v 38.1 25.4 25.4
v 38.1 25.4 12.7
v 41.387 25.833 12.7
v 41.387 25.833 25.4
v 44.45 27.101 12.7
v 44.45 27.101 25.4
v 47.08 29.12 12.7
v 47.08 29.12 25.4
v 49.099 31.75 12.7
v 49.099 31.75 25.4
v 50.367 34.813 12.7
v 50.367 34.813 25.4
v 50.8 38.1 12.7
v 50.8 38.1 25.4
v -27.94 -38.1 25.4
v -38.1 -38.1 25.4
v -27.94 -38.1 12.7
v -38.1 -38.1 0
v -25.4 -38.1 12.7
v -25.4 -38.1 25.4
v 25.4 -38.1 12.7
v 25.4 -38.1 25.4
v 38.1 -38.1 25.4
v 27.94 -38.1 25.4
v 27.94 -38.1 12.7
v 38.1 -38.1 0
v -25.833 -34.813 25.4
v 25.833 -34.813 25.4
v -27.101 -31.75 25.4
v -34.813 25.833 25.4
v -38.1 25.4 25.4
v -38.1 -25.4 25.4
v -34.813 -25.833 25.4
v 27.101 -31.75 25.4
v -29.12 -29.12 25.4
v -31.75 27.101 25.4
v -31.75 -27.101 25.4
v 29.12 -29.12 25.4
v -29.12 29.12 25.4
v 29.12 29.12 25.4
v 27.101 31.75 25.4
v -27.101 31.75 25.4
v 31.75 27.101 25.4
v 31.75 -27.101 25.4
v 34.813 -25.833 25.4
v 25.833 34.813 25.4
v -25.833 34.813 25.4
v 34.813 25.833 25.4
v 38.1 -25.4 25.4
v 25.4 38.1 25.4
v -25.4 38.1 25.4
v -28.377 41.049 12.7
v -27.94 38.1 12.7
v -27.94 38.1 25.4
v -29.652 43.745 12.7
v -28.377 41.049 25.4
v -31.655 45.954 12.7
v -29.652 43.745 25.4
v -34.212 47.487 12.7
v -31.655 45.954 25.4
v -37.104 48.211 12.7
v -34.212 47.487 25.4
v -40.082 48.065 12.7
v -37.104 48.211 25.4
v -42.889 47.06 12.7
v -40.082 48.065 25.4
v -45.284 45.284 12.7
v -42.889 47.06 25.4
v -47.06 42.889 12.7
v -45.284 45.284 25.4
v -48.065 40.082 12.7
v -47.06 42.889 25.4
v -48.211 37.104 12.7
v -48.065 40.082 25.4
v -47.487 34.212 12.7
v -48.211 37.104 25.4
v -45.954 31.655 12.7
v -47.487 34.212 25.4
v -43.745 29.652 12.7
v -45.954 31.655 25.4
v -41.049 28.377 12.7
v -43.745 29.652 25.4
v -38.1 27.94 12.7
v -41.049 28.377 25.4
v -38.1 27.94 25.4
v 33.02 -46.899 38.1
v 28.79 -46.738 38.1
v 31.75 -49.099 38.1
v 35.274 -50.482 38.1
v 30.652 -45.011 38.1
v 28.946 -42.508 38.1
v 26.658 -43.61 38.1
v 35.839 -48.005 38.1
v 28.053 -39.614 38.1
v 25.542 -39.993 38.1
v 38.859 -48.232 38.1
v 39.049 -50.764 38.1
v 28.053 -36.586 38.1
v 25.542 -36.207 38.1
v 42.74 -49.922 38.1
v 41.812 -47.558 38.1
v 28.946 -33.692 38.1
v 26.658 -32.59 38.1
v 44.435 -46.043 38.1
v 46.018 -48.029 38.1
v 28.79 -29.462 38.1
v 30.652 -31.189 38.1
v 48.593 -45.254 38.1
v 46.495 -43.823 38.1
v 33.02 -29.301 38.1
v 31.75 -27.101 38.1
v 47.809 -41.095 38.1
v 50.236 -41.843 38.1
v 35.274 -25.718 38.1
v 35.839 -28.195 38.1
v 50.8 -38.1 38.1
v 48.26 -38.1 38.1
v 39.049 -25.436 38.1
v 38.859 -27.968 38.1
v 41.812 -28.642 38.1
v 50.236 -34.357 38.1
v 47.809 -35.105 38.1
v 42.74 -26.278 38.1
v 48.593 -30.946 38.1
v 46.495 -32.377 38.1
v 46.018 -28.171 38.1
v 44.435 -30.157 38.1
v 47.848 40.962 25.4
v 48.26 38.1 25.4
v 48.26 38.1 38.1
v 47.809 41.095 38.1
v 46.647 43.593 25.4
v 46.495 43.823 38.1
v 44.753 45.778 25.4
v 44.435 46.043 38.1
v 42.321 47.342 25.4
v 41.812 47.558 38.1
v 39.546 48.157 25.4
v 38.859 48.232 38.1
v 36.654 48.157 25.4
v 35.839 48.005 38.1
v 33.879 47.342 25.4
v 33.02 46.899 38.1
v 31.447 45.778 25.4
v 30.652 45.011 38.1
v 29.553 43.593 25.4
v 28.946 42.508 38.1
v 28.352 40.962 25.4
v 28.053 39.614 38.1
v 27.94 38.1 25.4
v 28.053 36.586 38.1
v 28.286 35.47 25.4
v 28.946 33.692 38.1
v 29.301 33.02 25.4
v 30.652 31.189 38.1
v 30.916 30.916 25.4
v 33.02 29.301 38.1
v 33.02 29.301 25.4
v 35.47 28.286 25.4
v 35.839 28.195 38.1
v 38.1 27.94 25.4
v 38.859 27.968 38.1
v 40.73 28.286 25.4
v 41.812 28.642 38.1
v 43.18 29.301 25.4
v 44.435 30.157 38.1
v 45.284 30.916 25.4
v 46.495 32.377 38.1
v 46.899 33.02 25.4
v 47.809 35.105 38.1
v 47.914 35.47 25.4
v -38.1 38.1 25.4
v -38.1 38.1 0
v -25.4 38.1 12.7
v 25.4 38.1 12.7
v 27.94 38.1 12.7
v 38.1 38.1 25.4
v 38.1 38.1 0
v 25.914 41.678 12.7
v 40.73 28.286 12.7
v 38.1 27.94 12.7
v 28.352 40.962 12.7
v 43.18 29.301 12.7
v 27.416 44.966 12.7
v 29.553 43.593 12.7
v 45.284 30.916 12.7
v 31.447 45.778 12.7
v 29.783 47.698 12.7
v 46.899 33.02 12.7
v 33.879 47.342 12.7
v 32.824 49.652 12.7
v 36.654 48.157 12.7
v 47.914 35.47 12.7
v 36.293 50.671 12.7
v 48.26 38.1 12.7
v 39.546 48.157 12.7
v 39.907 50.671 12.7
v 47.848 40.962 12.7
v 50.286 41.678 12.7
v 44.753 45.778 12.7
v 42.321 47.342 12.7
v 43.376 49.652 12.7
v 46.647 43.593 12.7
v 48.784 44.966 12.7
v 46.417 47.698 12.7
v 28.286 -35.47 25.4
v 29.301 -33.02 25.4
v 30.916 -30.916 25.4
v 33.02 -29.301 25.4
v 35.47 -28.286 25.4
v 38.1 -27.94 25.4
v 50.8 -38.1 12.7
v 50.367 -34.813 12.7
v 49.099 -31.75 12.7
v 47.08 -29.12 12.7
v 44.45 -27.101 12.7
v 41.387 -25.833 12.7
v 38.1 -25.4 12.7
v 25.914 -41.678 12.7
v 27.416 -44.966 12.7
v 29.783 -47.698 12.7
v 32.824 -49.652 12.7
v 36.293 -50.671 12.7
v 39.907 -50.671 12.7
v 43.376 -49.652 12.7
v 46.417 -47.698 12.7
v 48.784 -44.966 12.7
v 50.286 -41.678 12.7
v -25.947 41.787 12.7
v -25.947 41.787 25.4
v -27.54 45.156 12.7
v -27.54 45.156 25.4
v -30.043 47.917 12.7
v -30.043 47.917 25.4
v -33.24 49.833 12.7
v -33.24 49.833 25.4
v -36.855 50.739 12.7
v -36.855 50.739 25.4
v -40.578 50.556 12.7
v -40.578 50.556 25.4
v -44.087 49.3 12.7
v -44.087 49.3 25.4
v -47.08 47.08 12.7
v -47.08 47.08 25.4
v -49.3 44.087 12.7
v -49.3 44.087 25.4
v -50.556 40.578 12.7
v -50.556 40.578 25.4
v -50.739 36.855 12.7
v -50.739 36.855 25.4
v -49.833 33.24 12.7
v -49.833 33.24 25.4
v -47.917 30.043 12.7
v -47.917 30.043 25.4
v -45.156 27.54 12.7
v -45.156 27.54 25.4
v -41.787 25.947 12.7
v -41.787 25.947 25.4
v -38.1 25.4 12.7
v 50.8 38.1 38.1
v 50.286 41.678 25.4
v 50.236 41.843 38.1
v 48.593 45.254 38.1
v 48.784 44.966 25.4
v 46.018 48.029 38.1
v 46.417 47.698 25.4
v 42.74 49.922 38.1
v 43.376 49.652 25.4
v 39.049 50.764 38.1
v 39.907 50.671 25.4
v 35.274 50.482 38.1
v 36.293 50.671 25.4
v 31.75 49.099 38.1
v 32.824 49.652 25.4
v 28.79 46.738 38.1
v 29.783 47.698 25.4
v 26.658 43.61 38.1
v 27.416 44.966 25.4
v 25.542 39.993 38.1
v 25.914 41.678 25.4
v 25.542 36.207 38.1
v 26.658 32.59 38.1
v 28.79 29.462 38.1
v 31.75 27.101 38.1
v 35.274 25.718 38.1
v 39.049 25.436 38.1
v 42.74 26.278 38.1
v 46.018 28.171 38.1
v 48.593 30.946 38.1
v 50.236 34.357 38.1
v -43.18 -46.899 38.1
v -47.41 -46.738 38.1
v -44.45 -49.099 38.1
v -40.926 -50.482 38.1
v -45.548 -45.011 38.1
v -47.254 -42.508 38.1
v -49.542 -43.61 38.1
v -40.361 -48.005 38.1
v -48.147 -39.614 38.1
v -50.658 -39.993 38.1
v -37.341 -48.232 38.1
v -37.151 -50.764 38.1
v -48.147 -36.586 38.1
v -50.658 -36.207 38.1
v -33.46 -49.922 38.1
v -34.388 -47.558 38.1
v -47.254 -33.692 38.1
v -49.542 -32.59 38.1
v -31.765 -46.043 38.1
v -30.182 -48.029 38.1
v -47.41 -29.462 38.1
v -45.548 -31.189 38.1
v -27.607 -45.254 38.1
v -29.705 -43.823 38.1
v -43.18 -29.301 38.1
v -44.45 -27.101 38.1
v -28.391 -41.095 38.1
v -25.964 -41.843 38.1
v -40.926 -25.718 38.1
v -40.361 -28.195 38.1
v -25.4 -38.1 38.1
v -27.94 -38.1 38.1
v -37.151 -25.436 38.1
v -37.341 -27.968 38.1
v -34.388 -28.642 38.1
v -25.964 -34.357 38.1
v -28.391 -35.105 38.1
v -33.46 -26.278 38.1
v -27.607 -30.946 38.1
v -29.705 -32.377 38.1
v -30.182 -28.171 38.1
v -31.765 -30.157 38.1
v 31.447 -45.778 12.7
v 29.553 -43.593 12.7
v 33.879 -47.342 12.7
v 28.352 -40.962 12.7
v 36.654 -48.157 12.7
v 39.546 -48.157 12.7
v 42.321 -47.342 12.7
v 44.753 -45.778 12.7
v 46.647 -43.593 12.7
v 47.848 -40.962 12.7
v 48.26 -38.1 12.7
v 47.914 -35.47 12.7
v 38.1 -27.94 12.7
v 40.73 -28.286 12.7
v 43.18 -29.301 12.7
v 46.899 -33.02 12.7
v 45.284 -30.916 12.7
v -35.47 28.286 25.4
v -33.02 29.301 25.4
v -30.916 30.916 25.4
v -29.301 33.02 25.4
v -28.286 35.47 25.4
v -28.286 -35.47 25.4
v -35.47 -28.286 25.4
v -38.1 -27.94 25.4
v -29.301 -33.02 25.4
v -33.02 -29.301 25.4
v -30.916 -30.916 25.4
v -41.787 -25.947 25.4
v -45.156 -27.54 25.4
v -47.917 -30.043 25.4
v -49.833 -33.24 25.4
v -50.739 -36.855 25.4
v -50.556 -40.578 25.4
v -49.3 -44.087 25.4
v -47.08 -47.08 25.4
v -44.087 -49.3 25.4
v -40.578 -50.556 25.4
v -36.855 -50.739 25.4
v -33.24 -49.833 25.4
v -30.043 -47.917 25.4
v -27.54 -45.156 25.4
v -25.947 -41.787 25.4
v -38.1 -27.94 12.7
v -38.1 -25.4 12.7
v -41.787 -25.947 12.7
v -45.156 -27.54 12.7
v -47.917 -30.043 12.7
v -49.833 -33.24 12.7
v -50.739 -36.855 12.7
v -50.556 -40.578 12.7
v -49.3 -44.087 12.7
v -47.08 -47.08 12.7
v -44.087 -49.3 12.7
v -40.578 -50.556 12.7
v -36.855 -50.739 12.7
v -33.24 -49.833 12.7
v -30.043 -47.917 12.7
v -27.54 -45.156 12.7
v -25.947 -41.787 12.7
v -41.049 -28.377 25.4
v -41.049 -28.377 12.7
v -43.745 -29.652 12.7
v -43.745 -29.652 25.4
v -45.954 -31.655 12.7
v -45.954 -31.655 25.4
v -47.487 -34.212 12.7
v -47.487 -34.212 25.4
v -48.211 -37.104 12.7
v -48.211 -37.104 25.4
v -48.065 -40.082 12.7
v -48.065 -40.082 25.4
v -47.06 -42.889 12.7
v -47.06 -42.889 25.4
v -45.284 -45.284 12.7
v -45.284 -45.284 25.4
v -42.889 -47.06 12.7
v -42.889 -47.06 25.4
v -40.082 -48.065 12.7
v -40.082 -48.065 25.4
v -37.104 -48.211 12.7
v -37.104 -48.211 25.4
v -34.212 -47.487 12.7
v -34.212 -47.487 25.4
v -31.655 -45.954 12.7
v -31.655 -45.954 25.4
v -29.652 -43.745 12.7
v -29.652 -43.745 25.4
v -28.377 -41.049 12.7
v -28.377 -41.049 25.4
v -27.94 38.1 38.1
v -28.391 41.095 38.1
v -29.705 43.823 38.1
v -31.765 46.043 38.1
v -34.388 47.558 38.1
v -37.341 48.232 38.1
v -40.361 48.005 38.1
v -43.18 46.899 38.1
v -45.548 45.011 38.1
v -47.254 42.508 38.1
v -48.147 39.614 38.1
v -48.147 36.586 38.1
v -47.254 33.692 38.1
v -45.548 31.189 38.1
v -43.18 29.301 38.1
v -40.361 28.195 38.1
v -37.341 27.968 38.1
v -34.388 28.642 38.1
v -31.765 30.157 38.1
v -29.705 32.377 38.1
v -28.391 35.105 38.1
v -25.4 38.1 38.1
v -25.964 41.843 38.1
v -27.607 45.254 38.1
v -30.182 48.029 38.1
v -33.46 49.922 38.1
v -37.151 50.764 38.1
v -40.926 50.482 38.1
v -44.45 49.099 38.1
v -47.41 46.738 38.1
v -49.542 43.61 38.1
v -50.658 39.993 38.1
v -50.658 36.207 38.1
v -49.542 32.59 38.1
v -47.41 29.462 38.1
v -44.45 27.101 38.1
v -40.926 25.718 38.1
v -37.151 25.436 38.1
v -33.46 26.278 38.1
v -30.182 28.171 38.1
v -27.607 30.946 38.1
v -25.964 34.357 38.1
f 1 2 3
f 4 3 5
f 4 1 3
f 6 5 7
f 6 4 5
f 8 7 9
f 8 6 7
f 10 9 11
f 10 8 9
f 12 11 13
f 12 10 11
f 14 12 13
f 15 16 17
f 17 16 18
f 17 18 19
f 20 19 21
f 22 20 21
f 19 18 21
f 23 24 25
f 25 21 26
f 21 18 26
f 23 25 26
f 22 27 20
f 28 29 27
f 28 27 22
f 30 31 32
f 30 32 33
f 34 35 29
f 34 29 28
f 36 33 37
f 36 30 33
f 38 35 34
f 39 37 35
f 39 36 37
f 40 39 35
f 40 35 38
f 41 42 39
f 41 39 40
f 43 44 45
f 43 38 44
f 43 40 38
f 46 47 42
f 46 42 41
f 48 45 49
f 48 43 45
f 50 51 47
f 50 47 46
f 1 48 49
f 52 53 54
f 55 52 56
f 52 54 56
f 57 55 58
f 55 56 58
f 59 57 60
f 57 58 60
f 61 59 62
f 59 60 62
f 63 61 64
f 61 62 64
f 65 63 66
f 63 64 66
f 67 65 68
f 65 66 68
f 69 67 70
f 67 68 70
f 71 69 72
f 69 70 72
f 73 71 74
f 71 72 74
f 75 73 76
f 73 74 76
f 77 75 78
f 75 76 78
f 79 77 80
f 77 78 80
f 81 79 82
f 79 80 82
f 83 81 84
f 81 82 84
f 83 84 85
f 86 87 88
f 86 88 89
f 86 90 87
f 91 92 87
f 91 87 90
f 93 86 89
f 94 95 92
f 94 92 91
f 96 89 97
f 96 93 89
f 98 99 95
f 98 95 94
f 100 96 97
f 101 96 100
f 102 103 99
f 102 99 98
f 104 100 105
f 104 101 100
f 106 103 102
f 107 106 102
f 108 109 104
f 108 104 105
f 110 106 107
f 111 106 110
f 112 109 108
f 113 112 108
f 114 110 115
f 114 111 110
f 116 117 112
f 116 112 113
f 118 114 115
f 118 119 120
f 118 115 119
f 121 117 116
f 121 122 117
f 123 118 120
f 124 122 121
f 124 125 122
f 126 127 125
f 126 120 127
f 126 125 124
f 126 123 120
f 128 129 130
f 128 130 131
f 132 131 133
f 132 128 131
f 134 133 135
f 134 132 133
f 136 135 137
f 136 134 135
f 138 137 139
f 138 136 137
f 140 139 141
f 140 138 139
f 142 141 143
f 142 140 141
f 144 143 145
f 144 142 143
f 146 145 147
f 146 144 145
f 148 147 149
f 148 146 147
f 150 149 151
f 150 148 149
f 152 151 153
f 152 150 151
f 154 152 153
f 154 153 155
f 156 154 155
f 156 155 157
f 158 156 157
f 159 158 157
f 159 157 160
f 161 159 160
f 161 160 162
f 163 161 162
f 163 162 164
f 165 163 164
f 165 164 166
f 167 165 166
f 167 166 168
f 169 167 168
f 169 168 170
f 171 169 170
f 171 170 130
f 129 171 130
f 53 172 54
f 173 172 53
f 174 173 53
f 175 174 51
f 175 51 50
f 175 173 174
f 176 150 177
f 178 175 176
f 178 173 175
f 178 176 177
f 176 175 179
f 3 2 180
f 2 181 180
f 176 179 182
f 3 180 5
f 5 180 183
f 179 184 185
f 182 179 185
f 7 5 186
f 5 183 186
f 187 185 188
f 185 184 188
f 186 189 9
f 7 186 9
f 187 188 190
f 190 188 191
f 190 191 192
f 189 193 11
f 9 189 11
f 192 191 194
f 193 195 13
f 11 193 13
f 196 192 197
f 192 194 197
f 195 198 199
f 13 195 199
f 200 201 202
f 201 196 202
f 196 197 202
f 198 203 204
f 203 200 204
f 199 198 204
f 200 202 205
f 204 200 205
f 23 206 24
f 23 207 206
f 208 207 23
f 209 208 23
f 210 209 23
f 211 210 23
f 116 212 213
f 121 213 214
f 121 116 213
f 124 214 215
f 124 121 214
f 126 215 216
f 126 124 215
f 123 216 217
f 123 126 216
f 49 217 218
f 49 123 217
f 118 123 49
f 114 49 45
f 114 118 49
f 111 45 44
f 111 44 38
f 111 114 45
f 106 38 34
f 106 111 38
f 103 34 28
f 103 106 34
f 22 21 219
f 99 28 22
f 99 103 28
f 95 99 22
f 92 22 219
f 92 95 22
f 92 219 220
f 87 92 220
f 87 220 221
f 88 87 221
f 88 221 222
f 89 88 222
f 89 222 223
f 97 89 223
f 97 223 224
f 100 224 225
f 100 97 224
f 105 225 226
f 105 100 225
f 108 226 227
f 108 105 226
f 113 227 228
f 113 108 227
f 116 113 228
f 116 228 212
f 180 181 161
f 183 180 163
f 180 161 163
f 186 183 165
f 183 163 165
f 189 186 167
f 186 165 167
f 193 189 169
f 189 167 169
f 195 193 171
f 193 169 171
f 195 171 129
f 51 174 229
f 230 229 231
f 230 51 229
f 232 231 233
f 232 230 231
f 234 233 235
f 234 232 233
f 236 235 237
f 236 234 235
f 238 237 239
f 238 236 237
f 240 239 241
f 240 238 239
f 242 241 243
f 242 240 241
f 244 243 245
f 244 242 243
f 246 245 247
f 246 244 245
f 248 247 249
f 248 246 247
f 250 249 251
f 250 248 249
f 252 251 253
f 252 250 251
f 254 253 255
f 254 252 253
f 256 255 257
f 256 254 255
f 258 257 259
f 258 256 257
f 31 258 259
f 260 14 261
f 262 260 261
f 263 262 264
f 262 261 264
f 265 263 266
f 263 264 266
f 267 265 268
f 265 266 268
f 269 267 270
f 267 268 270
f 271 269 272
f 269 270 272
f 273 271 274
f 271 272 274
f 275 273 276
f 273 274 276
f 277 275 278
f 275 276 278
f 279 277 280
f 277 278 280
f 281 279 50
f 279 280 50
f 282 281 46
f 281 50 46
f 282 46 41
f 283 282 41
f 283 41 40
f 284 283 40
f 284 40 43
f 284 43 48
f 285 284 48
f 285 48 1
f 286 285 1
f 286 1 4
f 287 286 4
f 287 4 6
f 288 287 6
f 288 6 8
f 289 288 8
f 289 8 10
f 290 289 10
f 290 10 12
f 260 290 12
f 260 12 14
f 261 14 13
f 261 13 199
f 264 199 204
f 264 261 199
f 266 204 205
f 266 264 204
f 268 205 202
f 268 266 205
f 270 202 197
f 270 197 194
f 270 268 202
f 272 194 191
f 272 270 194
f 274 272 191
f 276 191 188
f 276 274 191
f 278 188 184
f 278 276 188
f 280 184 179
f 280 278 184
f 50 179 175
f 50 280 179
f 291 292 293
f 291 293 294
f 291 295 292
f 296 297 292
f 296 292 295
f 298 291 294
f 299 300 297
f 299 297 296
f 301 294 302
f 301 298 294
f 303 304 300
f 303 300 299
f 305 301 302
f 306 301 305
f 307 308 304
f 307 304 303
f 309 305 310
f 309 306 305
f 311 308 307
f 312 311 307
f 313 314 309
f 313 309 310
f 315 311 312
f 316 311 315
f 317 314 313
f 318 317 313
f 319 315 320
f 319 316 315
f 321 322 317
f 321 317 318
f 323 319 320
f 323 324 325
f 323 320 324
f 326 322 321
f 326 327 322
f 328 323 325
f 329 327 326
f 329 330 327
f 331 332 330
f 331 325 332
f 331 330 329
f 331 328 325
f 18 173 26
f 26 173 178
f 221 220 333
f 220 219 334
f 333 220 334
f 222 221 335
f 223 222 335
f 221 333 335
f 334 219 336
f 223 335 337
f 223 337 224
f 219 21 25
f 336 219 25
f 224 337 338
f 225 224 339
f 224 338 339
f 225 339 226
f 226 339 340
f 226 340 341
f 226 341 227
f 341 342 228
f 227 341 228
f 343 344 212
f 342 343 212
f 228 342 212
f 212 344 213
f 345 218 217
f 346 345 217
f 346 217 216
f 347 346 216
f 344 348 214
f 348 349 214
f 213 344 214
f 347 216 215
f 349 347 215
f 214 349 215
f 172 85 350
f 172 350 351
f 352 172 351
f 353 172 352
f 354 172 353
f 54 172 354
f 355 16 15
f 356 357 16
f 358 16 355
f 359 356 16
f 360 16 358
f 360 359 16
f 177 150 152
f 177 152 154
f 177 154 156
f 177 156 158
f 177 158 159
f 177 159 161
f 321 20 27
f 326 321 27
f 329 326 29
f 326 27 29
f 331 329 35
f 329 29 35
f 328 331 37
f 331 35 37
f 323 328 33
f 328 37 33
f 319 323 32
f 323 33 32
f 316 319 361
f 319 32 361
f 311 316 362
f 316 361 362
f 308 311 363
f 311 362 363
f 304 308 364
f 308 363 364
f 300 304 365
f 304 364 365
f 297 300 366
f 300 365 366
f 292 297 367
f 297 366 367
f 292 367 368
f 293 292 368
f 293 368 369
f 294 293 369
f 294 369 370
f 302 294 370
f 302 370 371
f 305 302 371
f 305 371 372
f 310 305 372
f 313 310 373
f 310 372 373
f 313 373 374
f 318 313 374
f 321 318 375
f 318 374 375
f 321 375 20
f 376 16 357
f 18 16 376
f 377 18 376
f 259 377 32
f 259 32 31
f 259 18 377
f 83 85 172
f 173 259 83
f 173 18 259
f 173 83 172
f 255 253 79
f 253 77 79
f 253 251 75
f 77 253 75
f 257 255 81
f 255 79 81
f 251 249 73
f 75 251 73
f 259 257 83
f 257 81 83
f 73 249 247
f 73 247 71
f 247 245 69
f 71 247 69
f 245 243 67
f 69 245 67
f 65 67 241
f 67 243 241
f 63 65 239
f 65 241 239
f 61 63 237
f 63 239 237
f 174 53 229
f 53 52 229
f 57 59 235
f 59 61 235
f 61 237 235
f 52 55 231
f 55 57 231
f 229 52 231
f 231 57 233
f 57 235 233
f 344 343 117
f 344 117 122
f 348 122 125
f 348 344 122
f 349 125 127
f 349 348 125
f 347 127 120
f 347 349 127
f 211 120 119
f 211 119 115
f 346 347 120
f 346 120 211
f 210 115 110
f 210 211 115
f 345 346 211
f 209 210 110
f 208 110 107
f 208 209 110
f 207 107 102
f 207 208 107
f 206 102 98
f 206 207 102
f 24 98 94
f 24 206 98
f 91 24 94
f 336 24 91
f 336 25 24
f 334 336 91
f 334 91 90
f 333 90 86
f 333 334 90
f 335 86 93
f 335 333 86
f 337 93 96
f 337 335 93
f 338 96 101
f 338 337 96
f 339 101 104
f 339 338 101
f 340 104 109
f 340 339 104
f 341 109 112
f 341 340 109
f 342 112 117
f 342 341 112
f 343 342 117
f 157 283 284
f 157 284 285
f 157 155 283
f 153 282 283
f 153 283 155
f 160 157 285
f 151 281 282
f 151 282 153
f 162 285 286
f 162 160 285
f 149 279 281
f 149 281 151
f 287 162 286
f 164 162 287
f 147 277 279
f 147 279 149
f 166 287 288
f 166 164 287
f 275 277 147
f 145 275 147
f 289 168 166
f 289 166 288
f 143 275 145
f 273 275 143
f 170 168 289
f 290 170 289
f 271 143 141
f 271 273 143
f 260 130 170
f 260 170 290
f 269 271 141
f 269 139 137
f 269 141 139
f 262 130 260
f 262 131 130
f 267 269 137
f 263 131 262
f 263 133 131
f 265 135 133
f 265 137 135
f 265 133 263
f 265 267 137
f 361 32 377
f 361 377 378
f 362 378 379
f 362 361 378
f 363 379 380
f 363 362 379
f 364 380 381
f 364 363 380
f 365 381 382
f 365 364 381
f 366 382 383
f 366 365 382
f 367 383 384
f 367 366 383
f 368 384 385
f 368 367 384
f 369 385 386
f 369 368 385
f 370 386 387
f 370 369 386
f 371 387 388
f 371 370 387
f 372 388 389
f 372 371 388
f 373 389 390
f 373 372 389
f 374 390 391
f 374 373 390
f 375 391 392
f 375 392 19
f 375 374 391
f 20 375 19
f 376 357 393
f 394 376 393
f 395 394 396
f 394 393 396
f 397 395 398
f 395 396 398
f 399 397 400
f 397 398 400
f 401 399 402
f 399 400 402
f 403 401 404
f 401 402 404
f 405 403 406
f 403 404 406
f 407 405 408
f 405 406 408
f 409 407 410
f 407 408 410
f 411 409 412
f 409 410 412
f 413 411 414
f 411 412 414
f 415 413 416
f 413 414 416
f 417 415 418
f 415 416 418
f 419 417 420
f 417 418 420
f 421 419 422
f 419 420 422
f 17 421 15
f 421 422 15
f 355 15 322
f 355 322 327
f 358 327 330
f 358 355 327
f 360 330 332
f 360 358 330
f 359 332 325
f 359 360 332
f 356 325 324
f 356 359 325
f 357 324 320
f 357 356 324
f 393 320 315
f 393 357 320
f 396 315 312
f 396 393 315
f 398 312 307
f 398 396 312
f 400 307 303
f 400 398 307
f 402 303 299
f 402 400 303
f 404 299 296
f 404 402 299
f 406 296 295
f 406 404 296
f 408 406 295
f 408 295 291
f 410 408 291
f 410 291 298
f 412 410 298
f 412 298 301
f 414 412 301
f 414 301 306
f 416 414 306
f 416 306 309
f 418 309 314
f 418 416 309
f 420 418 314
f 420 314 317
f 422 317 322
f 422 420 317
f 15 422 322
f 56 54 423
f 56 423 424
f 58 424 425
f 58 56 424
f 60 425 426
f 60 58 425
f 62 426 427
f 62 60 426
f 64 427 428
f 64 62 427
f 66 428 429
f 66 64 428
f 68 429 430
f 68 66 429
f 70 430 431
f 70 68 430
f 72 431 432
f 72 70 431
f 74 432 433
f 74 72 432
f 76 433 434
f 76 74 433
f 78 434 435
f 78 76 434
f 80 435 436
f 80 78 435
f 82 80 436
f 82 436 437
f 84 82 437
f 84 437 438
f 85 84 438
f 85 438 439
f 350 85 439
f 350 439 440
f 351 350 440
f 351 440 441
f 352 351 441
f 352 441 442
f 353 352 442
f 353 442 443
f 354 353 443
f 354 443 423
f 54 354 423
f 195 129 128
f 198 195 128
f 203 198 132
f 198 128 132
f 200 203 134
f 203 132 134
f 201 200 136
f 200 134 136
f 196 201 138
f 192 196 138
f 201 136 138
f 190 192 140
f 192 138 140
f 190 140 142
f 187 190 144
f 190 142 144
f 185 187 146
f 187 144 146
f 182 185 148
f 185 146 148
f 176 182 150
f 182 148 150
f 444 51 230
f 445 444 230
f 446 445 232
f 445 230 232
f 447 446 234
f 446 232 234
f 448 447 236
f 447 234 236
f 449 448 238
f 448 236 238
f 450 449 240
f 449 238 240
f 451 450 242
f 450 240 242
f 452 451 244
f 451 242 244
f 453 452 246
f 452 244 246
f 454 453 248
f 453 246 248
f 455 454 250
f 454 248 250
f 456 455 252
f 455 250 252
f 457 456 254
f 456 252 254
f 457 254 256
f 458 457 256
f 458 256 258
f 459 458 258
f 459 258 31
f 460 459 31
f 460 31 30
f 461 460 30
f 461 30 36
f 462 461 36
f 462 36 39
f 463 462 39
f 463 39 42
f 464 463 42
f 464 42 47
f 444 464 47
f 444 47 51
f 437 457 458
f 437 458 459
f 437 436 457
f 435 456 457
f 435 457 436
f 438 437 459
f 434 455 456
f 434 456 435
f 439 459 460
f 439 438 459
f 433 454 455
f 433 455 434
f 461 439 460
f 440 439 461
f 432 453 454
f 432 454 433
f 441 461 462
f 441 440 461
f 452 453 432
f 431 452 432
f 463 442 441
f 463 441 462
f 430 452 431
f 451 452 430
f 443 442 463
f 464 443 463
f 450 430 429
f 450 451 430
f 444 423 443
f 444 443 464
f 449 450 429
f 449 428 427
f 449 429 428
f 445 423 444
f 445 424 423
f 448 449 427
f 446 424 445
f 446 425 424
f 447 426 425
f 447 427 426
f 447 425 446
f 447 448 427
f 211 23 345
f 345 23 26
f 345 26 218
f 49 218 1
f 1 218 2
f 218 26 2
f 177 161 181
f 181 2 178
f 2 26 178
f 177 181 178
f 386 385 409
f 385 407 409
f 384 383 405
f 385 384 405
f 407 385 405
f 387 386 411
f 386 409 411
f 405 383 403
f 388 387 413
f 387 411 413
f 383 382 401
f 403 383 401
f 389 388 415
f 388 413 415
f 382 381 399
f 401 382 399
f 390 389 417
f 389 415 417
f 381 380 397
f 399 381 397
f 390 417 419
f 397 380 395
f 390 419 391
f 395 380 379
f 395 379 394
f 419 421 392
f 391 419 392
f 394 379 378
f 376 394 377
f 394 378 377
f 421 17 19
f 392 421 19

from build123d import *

# Parameters (mm, degrees)
F0_W     = 76.2
F0_H     = 76.2
F1_DEPTH = 25.4
F2_R     = 12.7
F2_R_2   = 10.16
F3_DEPTH = 12.7


with BuildPart() as f1:
    # F0 (on Top) → F1 (new body)
    with BuildSketch(Plane.XY):
        Rectangle(F0_W, F0_H)
    extrude(amount=F1_DEPTH)

    # F2 (on face) → F3 (join, symmetric)
    with BuildSketch(Plane.XY.offset(25.4)):
        with Locations((-38.1, 38.1)):
            Circle(F2_R)
        with Locations((-38.1, 38.1)):
            Circle(F2_R_2, mode=Mode.SUBTRACT)
        with Locations((38.1, 38.1)):
            Circle(F2_R)
        with Locations((38.1, 38.1)):
            Circle(F2_R_2, mode=Mode.SUBTRACT)
        with Locations((-38.1, -38.1)):
            Circle(F2_R)
        with Locations((-38.1, -38.1)):
            Circle(F2_R_2, mode=Mode.SUBTRACT)
        with Locations((38.1, -38.1)):
            Circle(F2_R)
        with Locations((38.1, -38.1)):
            Circle(F2_R_2, mode=Mode.SUBTRACT)
    extrude(amount=F3_DEPTH, both=True)


solid = f1.part
